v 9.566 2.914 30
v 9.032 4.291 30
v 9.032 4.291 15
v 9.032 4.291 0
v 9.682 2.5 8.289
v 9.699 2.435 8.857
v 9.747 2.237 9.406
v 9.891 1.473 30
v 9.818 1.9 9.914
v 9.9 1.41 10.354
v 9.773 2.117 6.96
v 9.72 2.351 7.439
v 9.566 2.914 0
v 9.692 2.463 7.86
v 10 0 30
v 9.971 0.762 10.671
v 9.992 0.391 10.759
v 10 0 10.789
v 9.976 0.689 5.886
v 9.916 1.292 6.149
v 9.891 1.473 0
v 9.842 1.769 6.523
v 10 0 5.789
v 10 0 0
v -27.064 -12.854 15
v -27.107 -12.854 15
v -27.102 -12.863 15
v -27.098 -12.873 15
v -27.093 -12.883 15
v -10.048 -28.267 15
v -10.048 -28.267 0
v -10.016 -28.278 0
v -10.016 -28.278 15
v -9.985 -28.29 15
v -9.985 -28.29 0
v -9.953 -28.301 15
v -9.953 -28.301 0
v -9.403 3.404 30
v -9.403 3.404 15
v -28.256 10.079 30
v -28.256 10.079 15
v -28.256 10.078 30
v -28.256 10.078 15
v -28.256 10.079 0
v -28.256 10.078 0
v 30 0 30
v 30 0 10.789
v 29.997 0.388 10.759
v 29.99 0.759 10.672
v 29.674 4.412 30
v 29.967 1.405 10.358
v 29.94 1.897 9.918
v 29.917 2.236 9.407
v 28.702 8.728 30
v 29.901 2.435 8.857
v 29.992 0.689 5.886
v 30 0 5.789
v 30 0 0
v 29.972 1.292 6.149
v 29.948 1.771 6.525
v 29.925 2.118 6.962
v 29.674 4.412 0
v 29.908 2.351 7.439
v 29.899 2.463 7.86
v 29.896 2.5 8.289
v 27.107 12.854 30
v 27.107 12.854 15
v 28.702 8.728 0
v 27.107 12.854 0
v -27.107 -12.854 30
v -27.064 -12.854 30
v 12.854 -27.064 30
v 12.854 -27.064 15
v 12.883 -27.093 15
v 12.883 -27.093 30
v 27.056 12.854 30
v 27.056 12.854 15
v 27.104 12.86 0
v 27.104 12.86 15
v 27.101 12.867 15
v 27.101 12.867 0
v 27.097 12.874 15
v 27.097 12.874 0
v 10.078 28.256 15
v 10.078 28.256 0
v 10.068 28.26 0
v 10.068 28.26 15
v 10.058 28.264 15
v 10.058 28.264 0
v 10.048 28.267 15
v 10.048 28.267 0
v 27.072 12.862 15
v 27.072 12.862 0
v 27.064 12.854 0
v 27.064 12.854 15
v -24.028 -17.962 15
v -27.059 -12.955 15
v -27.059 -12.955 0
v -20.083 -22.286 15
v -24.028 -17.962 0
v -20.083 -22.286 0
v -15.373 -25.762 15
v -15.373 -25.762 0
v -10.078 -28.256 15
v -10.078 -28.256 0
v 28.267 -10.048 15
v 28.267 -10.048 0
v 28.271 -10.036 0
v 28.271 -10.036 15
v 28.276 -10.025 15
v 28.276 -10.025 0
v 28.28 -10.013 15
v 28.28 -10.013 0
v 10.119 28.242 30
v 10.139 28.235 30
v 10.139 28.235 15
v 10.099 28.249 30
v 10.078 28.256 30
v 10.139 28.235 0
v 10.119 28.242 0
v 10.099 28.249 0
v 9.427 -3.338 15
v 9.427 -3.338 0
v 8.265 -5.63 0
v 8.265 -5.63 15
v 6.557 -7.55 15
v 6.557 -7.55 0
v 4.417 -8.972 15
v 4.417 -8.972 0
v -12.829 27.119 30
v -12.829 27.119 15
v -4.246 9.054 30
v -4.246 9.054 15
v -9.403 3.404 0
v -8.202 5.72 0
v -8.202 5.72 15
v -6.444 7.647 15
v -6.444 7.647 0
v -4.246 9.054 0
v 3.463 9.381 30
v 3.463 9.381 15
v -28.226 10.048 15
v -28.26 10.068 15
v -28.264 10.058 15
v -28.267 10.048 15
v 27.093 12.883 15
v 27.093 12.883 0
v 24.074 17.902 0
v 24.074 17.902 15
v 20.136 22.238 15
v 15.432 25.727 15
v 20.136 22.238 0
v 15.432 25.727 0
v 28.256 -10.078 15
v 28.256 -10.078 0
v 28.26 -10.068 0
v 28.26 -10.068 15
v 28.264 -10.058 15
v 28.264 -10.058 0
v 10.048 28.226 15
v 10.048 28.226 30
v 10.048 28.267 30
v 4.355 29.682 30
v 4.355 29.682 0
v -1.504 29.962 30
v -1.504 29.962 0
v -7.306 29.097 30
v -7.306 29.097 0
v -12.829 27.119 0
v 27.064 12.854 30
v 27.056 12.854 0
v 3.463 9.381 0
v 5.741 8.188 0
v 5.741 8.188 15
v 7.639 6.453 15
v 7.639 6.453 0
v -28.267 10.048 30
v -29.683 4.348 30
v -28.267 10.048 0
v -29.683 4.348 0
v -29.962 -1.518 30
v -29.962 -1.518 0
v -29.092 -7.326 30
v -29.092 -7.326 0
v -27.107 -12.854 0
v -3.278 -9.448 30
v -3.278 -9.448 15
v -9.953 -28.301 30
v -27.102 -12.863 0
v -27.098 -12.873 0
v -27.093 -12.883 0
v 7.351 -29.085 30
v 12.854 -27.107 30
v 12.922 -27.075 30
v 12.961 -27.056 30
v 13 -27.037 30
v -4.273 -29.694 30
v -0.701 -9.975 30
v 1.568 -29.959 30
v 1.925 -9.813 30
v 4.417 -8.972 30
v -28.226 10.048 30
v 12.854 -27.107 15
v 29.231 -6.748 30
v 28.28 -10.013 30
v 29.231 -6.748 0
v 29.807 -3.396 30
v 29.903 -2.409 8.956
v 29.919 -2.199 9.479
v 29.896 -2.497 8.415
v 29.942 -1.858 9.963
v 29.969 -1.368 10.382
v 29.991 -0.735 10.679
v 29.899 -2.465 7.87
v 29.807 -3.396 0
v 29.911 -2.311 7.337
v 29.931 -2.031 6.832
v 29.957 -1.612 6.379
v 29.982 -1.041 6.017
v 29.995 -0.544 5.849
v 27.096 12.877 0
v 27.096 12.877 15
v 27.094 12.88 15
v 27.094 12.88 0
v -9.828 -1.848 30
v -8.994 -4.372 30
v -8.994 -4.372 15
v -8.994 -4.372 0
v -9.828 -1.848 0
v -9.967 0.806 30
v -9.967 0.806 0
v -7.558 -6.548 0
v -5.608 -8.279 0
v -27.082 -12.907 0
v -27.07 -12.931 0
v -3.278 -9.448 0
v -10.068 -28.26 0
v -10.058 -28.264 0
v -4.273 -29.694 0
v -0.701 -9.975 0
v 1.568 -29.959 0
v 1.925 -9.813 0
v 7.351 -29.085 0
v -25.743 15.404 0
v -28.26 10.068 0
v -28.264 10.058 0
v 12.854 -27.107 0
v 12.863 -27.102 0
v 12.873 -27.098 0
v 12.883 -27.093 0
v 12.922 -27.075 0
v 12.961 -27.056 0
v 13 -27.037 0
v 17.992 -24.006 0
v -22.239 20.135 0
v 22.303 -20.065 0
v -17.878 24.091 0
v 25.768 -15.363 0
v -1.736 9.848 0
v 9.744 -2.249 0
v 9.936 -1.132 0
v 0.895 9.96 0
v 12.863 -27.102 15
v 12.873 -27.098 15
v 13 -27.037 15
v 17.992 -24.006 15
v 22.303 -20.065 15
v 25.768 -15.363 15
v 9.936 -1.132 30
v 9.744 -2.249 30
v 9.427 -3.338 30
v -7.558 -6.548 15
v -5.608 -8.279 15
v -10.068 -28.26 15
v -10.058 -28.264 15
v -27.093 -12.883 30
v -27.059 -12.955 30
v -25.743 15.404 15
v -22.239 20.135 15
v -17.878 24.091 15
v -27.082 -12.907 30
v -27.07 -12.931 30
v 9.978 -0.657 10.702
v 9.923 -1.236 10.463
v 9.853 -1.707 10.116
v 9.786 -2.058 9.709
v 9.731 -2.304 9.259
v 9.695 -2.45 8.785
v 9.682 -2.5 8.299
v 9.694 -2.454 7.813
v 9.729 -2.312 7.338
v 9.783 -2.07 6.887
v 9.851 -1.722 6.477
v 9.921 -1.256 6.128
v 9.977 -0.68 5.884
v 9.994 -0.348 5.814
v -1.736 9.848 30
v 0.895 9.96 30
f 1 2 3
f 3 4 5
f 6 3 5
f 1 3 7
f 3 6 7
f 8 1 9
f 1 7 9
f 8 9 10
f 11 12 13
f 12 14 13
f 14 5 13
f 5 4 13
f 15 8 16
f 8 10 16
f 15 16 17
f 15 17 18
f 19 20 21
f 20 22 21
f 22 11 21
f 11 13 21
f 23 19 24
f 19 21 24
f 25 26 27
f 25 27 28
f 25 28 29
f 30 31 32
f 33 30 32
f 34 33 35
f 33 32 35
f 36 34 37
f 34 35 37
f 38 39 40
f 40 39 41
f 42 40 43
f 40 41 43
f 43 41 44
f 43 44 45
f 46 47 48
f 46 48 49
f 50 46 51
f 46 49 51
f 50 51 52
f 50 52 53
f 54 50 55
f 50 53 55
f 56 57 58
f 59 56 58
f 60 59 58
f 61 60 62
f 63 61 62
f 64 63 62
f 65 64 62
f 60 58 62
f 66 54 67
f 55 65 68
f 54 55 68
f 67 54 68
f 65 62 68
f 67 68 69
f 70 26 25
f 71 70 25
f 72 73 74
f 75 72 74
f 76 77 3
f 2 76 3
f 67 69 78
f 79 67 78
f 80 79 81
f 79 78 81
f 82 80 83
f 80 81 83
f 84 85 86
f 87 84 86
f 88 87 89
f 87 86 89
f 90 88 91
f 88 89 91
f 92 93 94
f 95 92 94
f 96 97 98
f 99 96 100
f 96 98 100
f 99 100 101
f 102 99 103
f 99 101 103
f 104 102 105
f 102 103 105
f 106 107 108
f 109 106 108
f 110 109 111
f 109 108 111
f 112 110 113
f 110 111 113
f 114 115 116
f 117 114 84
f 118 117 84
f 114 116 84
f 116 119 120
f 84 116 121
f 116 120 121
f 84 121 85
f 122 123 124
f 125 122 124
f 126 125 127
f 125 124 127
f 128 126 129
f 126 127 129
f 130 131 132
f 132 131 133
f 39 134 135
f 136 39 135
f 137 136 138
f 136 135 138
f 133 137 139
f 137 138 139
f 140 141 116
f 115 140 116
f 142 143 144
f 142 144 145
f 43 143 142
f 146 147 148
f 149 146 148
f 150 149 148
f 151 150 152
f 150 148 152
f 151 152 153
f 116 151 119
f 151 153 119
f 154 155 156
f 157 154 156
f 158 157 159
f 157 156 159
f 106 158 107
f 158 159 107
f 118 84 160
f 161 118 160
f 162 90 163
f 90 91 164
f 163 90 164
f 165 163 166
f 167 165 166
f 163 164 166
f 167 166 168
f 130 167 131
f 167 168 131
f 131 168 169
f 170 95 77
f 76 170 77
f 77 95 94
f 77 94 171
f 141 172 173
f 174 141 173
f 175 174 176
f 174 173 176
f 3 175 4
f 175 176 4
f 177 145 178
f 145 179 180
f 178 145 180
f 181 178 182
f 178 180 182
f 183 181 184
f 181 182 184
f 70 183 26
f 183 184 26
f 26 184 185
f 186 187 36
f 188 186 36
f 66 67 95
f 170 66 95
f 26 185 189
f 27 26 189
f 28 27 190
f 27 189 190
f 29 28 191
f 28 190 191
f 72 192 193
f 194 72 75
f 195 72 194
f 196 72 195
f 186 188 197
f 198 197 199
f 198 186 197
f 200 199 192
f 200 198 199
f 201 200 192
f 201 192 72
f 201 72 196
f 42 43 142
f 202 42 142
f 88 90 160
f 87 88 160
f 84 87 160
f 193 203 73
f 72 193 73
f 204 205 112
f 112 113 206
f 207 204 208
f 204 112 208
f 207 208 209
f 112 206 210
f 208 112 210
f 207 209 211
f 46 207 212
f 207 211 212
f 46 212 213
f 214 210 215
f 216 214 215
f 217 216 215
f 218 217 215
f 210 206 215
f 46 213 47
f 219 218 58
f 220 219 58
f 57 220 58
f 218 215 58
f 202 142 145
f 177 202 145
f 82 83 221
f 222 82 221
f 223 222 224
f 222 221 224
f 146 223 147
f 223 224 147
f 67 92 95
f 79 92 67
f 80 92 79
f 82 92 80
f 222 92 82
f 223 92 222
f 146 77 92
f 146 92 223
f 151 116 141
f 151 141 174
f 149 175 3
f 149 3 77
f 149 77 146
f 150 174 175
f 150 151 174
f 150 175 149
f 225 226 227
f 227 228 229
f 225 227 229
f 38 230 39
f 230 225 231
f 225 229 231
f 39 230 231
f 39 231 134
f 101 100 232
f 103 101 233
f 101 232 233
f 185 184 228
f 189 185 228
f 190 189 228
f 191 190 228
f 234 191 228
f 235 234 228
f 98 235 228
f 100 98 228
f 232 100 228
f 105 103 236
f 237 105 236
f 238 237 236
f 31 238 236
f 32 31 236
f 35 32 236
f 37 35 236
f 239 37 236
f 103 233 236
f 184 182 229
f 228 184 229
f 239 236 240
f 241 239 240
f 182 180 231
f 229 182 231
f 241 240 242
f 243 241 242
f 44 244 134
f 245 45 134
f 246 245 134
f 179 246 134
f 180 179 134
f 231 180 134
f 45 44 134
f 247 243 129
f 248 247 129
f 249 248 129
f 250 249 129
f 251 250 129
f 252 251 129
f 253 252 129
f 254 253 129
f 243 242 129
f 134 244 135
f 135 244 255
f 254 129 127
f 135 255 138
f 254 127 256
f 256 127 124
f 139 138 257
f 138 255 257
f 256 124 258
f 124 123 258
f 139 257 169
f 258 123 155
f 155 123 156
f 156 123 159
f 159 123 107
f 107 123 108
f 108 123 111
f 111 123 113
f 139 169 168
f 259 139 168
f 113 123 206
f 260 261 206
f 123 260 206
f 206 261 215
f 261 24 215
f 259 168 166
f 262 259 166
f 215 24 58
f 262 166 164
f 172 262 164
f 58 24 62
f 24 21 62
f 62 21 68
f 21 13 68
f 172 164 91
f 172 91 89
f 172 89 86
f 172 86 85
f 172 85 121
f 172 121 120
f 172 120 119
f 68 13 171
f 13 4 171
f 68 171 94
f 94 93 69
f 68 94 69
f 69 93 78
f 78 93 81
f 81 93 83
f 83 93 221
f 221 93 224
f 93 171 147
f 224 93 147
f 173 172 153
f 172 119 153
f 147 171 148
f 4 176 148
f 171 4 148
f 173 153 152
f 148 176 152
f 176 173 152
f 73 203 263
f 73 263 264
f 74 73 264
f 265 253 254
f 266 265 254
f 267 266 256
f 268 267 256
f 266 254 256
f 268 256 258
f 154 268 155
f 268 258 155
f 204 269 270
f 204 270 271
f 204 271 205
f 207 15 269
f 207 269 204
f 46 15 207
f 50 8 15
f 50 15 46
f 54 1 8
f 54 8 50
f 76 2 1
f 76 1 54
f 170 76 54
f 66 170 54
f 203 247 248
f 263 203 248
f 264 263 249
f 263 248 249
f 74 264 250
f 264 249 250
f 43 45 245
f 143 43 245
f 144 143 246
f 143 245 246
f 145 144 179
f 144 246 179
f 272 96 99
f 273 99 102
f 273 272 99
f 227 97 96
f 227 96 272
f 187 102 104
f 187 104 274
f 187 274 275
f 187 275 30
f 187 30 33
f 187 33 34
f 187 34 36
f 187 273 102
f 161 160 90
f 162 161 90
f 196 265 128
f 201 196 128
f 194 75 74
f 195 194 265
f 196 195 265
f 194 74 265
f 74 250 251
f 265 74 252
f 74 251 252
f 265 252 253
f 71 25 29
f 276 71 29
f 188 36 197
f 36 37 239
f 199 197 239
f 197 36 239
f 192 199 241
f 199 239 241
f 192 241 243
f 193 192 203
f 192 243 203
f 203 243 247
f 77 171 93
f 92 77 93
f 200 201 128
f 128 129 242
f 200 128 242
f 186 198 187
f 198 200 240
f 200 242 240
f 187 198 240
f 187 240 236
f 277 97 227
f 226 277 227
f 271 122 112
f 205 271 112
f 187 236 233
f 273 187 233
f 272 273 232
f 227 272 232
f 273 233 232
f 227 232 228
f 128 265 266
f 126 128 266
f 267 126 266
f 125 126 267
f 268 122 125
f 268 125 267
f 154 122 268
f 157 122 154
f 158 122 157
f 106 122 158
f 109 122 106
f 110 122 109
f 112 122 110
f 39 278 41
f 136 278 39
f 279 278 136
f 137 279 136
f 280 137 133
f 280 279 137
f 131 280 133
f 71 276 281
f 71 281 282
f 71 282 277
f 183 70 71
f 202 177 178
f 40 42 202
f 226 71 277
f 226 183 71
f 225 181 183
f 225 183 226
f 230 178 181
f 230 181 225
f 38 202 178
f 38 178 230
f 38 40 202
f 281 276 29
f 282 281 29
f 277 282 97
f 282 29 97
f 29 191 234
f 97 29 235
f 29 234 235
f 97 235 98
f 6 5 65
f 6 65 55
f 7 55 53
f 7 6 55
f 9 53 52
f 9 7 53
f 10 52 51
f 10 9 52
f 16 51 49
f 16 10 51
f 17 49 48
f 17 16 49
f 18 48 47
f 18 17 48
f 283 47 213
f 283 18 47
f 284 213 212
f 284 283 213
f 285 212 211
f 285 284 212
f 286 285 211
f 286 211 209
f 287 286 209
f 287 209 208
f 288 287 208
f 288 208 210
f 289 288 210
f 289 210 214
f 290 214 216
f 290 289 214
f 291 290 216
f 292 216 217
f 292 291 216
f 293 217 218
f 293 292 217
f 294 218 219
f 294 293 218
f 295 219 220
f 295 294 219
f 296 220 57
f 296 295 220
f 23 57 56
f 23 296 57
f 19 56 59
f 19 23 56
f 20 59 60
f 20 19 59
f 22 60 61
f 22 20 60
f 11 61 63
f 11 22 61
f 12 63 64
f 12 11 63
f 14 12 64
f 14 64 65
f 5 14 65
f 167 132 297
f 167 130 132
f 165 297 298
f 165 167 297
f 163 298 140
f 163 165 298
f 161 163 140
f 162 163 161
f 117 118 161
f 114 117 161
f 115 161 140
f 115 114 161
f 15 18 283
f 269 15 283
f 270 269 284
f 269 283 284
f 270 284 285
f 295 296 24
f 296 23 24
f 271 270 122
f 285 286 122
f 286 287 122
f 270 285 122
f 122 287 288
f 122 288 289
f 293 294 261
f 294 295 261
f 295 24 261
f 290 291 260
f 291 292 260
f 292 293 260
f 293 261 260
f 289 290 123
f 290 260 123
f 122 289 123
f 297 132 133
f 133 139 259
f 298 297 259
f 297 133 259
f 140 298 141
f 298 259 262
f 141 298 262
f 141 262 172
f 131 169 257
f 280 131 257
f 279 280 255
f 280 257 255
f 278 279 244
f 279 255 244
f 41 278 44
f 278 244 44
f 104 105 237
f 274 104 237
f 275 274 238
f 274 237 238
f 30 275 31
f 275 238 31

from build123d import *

# Parameters (mm, degrees)
F1_DEPTH = 15
F3_DEPTH = 30
F2_R     = 2.5
F4_DEPTH = 34


with BuildPart() as f1:
    # F0 (on Top) → F1 (new body)
    with BuildSketch(Plane.XY):
        with BuildLine():
            ThreePointArc((9.032456, 4.29124), (9.755116, 2.199482), (10, 0))
            ThreePointArc((10, 0), (9.855601, -1.693258), (9.426575, -3.337616))
            Line((9.426575, -3.337616), (28.279726, -10.012847))
            ThreePointArc((28.279726, -10.012847), (29.566804, -5.079775), (30, 0))
            ThreePointArc((30, 0), (29.26777, 6.587689), (27.106824, 12.853797))
            Line((27.106824, 12.853797), (27.064093, 12.85387))
            Line((27.064093, 12.85387), (27.055619, 12.853885))
            Line((27.055619, 12.853885), (9.032456, 4.29124))
        make_face()
        with BuildLine():
            ThreePointArc((3.46339, 9.381094), (6.746347, 7.381518), (9.032456, 4.29124))
            Line((9.032456, 4.29124), (27.055619, 12.853885))
            Line((27.055619, 12.853885), (27.07179, 12.861568))
            Line((27.07179, 12.861568), (27.093042, 12.88282))
            ThreePointArc((27.093042, 12.88282), (20.136379, 22.237946), (10.13882, 28.234807))
            Line((10.13882, 28.234807), (3.46339, 9.381094))
        make_face()
        with BuildLine():
            Line((28.279726, -10.012847), (9.426575, -3.337616))
            ThreePointArc((9.426575, -3.337616), (7.472968, -6.644904), (4.416744, -8.971754))
            Line((4.416744, -8.971754), (12.999502, -27.037251))
            ThreePointArc((12.999502, -27.037251), (22.302768, -20.064559), (28.256426, -10.078412))
            Line((28.256426, -10.078412), (28.226262, -10.048145))
            Line((28.226262, -10.048145), (28.267203, -10.048145))
            ThreePointArc((28.267203, -10.048145), (28.27347, -10.030498), (28.279726, -10.012847))
        make_face()
        with BuildLine():
            ThreePointArc((-4.24614, 9.053745), (-0.424222, 9.990998), (3.46339, 9.381094))
            Line((3.46339, 9.381094), (10.13882, 28.234807))
            ThreePointArc((10.13882, 28.234807), (10.108621, 28.245633), (10.078412, 28.256426))
            Line((10.078412, 28.256426), (10.048145, 28.226262))
            Line((10.048145, 28.226262), (10.048145, 28.267203))
            ThreePointArc((10.048145, 28.267203), (-1.50418, 29.962267), (-12.828655, 27.118732))
            Line((-12.828655, 27.118732), (-4.24614, 9.053745))
        make_face()
        with BuildLine():
            Line((12.999502, -27.037251), (4.416744, -8.971754))
            ThreePointArc((4.416744, -8.971754), (0.617235, -9.980933), (-3.277666, -9.447587))
            Line((-3.277666, -9.447587), (-9.952942, -28.300865))
            ThreePointArc((-9.952942, -28.300865), (1.568494, -29.958969), (12.853797, -27.106824))
            Line((12.853797, -27.106824), (12.85387, -27.064093))
            Line((12.85387, -27.064093), (12.88282, -27.093042))
            ThreePointArc((12.88282, -27.093042), (12.941191, -27.06521), (12.999502, -27.037251))
        make_face()
        with BuildLine():
            ThreePointArc((-9.402907, 3.403723), (-7.386123, 6.741305), (-4.24614, 9.053745))
            Line((-4.24614, 9.053745), (-12.828655, 27.118732))
            ThreePointArc((-12.828655, 27.118732), (-22.239146, 20.135053), (-28.256213, 10.079009))
            Line((-28.256213, 10.079009), (-9.402907, 3.403723))
        make_face()
        with BuildLine():
            Line((27.07179, 12.861568), (27.064093, 12.85387))
            Line((27.064093, 12.85387), (27.106824, 12.853797))
            ThreePointArc((27.106824, 12.853797), (27.102098, 12.863759), (27.097368, 12.873719))
            Line((27.097368, 12.873719), (27.07179, 12.861568))
        make_face()
        with BuildLine():
            Line((27.093042, 12.88282), (27.07179, 12.861568))
            Line((27.07179, 12.861568), (27.097368, 12.873719))
            ThreePointArc((27.097368, 12.873719), (27.095206, 12.87827), (27.093042, 12.88282))
        make_face()
        with BuildLine():
            Line((-9.952942, -28.300865), (-3.277666, -9.447587))
            ThreePointArc((-3.277666, -9.447587), (-6.639802, -7.477502), (-8.993671, -4.371943))
            Line((-8.993671, -4.371943), (-27.058824, -12.954537))
            ThreePointArc((-27.058824, -12.954537), (-20.083091, -22.286083), (-10.078412, -28.256426))
            Line((-10.078412, -28.256426), (-10.048145, -28.226262))
            Line((-10.048145, -28.226262), (-10.048145, -28.267203))
            ThreePointArc((-10.048145, -28.267203), (-10.000557, -28.284074), (-9.952942, -28.300865))
        make_face()
        with BuildLine():
            ThreePointArc((28.256426, -10.078412), (28.261819, -10.06328), (28.267203, -10.048145))
            Line((28.267203, -10.048145), (28.226262, -10.048145))
            Line((28.226262, -10.048145), (28.256426, -10.078412))
        make_face()
        with BuildLine():
            ThreePointArc((-8.993671, -4.371943), (-9.986179, -0.525577), (-9.402907, 3.403723))
            Line((-9.402907, 3.403723), (-28.256213, 10.079009))
            ThreePointArc((-28.256213, 10.079009), (-28.25632, 10.07871), (-28.256426, 10.078412))
            Line((-28.256426, 10.078412), (-28.226262, 10.048145))
            Line((-28.226262, 10.048145), (-28.267203, 10.048145))
            ThreePointArc((-28.267203, 10.048145), (-29.961566, -1.518072), (-27.106824, -12.853797))
            Line((-27.106824, -12.853797), (-27.064093, -12.85387))
            Line((-27.064093, -12.85387), (-27.093042, -12.88282))
            ThreePointArc((-27.093042, -12.88282), (-27.075957, -12.91869), (-27.058824, -12.954537))
            Line((-27.058824, -12.954537), (-8.993671, -4.371943))
        make_face()
        with BuildLine():
            Line((10.048145, 28.226262), (10.078412, 28.256426))
            ThreePointArc((10.078412, 28.256426), (10.06328, 28.261819), (10.048145, 28.267203))
            Line((10.048145, 28.267203), (10.048145, 28.226262))
        make_face()
        with BuildLine():
            ThreePointArc((12.853797, -27.106824), (12.86831, -27.099937), (12.88282, -27.093042))
            Line((12.88282, -27.093042), (12.85387, -27.064093))
            Line((12.85387, -27.064093), (12.853797, -27.106824))
        make_face()
        with BuildLine():
            ThreePointArc((-10.078412, -28.256426), (-10.06328, -28.261819), (-10.048145, -28.267203))
            Line((-10.048145, -28.267203), (-10.048145, -28.226262))
            Line((-10.048145, -28.226262), (-10.078412, -28.256426))
        make_face()
        with BuildLine():
            Line((-28.226262, 10.048145), (-28.256426, 10.078412))
            ThreePointArc((-28.256426, 10.078412), (-28.261819, 10.06328), (-28.267203, 10.048145))
            Line((-28.267203, 10.048145), (-28.226262, 10.048145))
        make_face()
        with BuildLine():
            ThreePointArc((-27.106824, -12.853797), (-27.099937, -12.86831), (-27.093042, -12.88282))
            Line((-27.093042, -12.88282), (-27.064093, -12.85387))
            Line((-27.064093, -12.85387), (-27.106824, -12.853797))
        make_face()
    extrude(amount=F1_DEPTH)

    # F0 (on Top) → F3 (join)
    with BuildSketch(Plane.XY):
        with BuildLine():
            ThreePointArc((-4.24614, 9.053745), (-0.424222, 9.990998), (3.46339, 9.381094))
            Line((3.46339, 9.381094), (10.13882, 28.234807))
            ThreePointArc((10.13882, 28.234807), (10.108621, 28.245633), (10.078412, 28.256426))
            Line((10.078412, 28.256426), (10.048145, 28.226262))
            Line((10.048145, 28.226262), (10.048145, 28.267203))
            ThreePointArc((10.048145, 28.267203), (-1.50418, 29.962267), (-12.828655, 27.118732))
            Line((-12.828655, 27.118732), (-4.24614, 9.053745))
        make_face()
        with BuildLine():
            Line((12.999502, -27.037251), (4.416744, -8.971754))
            ThreePointArc((4.416744, -8.971754), (0.617235, -9.980933), (-3.277666, -9.447587))
            Line((-3.277666, -9.447587), (-9.952942, -28.300865))
            ThreePointArc((-9.952942, -28.300865), (1.568494, -29.958969), (12.853797, -27.106824))
            Line((12.853797, -27.106824), (12.85387, -27.064093))
            Line((12.85387, -27.064093), (12.88282, -27.093042))
            ThreePointArc((12.88282, -27.093042), (12.941191, -27.06521), (12.999502, -27.037251))
        make_face()
        with BuildLine():
            ThreePointArc((-8.993671, -4.371943), (-9.986179, -0.525577), (-9.402907, 3.403723))
            Line((-9.402907, 3.403723), (-28.256213, 10.079009))
            ThreePointArc((-28.256213, 10.079009), (-28.25632, 10.07871), (-28.256426, 10.078412))
            Line((-28.256426, 10.078412), (-28.226262, 10.048145))
            Line((-28.226262, 10.048145), (-28.267203, 10.048145))
            ThreePointArc((-28.267203, 10.048145), (-29.961566, -1.518072), (-27.106824, -12.853797))
            Line((-27.106824, -12.853797), (-27.064093, -12.85387))
            Line((-27.064093, -12.85387), (-27.093042, -12.88282))
            ThreePointArc((-27.093042, -12.88282), (-27.075957, -12.91869), (-27.058824, -12.954537))
            Line((-27.058824, -12.954537), (-8.993671, -4.371943))
        make_face()
        with BuildLine():
            ThreePointArc((9.032456, 4.29124), (9.755116, 2.199482), (10, 0))
            ThreePointArc((10, 0), (9.855601, -1.693258), (9.426575, -3.337616))
            Line((9.426575, -3.337616), (28.279726, -10.012847))
            ThreePointArc((28.279726, -10.012847), (29.566804, -5.079775), (30, 0))
            ThreePointArc((30, 0), (29.26777, 6.587689), (27.106824, 12.853797))
            Line((27.106824, 12.853797), (27.064093, 12.85387))
            Line((27.064093, 12.85387), (27.055619, 12.853885))
            Line((27.055619, 12.853885), (9.032456, 4.29124))
        make_face()
    extrude(amount=F3_DEPTH)

    # F2 (on Right) → F4 (cut)
    with BuildSketch(Plane.YZ):
        with Locations((0, 8.289474)):
            Circle(F2_R)
    extrude(amount=F4_DEPTH, mode=Mode.SUBTRACT)


solid = f1.part
